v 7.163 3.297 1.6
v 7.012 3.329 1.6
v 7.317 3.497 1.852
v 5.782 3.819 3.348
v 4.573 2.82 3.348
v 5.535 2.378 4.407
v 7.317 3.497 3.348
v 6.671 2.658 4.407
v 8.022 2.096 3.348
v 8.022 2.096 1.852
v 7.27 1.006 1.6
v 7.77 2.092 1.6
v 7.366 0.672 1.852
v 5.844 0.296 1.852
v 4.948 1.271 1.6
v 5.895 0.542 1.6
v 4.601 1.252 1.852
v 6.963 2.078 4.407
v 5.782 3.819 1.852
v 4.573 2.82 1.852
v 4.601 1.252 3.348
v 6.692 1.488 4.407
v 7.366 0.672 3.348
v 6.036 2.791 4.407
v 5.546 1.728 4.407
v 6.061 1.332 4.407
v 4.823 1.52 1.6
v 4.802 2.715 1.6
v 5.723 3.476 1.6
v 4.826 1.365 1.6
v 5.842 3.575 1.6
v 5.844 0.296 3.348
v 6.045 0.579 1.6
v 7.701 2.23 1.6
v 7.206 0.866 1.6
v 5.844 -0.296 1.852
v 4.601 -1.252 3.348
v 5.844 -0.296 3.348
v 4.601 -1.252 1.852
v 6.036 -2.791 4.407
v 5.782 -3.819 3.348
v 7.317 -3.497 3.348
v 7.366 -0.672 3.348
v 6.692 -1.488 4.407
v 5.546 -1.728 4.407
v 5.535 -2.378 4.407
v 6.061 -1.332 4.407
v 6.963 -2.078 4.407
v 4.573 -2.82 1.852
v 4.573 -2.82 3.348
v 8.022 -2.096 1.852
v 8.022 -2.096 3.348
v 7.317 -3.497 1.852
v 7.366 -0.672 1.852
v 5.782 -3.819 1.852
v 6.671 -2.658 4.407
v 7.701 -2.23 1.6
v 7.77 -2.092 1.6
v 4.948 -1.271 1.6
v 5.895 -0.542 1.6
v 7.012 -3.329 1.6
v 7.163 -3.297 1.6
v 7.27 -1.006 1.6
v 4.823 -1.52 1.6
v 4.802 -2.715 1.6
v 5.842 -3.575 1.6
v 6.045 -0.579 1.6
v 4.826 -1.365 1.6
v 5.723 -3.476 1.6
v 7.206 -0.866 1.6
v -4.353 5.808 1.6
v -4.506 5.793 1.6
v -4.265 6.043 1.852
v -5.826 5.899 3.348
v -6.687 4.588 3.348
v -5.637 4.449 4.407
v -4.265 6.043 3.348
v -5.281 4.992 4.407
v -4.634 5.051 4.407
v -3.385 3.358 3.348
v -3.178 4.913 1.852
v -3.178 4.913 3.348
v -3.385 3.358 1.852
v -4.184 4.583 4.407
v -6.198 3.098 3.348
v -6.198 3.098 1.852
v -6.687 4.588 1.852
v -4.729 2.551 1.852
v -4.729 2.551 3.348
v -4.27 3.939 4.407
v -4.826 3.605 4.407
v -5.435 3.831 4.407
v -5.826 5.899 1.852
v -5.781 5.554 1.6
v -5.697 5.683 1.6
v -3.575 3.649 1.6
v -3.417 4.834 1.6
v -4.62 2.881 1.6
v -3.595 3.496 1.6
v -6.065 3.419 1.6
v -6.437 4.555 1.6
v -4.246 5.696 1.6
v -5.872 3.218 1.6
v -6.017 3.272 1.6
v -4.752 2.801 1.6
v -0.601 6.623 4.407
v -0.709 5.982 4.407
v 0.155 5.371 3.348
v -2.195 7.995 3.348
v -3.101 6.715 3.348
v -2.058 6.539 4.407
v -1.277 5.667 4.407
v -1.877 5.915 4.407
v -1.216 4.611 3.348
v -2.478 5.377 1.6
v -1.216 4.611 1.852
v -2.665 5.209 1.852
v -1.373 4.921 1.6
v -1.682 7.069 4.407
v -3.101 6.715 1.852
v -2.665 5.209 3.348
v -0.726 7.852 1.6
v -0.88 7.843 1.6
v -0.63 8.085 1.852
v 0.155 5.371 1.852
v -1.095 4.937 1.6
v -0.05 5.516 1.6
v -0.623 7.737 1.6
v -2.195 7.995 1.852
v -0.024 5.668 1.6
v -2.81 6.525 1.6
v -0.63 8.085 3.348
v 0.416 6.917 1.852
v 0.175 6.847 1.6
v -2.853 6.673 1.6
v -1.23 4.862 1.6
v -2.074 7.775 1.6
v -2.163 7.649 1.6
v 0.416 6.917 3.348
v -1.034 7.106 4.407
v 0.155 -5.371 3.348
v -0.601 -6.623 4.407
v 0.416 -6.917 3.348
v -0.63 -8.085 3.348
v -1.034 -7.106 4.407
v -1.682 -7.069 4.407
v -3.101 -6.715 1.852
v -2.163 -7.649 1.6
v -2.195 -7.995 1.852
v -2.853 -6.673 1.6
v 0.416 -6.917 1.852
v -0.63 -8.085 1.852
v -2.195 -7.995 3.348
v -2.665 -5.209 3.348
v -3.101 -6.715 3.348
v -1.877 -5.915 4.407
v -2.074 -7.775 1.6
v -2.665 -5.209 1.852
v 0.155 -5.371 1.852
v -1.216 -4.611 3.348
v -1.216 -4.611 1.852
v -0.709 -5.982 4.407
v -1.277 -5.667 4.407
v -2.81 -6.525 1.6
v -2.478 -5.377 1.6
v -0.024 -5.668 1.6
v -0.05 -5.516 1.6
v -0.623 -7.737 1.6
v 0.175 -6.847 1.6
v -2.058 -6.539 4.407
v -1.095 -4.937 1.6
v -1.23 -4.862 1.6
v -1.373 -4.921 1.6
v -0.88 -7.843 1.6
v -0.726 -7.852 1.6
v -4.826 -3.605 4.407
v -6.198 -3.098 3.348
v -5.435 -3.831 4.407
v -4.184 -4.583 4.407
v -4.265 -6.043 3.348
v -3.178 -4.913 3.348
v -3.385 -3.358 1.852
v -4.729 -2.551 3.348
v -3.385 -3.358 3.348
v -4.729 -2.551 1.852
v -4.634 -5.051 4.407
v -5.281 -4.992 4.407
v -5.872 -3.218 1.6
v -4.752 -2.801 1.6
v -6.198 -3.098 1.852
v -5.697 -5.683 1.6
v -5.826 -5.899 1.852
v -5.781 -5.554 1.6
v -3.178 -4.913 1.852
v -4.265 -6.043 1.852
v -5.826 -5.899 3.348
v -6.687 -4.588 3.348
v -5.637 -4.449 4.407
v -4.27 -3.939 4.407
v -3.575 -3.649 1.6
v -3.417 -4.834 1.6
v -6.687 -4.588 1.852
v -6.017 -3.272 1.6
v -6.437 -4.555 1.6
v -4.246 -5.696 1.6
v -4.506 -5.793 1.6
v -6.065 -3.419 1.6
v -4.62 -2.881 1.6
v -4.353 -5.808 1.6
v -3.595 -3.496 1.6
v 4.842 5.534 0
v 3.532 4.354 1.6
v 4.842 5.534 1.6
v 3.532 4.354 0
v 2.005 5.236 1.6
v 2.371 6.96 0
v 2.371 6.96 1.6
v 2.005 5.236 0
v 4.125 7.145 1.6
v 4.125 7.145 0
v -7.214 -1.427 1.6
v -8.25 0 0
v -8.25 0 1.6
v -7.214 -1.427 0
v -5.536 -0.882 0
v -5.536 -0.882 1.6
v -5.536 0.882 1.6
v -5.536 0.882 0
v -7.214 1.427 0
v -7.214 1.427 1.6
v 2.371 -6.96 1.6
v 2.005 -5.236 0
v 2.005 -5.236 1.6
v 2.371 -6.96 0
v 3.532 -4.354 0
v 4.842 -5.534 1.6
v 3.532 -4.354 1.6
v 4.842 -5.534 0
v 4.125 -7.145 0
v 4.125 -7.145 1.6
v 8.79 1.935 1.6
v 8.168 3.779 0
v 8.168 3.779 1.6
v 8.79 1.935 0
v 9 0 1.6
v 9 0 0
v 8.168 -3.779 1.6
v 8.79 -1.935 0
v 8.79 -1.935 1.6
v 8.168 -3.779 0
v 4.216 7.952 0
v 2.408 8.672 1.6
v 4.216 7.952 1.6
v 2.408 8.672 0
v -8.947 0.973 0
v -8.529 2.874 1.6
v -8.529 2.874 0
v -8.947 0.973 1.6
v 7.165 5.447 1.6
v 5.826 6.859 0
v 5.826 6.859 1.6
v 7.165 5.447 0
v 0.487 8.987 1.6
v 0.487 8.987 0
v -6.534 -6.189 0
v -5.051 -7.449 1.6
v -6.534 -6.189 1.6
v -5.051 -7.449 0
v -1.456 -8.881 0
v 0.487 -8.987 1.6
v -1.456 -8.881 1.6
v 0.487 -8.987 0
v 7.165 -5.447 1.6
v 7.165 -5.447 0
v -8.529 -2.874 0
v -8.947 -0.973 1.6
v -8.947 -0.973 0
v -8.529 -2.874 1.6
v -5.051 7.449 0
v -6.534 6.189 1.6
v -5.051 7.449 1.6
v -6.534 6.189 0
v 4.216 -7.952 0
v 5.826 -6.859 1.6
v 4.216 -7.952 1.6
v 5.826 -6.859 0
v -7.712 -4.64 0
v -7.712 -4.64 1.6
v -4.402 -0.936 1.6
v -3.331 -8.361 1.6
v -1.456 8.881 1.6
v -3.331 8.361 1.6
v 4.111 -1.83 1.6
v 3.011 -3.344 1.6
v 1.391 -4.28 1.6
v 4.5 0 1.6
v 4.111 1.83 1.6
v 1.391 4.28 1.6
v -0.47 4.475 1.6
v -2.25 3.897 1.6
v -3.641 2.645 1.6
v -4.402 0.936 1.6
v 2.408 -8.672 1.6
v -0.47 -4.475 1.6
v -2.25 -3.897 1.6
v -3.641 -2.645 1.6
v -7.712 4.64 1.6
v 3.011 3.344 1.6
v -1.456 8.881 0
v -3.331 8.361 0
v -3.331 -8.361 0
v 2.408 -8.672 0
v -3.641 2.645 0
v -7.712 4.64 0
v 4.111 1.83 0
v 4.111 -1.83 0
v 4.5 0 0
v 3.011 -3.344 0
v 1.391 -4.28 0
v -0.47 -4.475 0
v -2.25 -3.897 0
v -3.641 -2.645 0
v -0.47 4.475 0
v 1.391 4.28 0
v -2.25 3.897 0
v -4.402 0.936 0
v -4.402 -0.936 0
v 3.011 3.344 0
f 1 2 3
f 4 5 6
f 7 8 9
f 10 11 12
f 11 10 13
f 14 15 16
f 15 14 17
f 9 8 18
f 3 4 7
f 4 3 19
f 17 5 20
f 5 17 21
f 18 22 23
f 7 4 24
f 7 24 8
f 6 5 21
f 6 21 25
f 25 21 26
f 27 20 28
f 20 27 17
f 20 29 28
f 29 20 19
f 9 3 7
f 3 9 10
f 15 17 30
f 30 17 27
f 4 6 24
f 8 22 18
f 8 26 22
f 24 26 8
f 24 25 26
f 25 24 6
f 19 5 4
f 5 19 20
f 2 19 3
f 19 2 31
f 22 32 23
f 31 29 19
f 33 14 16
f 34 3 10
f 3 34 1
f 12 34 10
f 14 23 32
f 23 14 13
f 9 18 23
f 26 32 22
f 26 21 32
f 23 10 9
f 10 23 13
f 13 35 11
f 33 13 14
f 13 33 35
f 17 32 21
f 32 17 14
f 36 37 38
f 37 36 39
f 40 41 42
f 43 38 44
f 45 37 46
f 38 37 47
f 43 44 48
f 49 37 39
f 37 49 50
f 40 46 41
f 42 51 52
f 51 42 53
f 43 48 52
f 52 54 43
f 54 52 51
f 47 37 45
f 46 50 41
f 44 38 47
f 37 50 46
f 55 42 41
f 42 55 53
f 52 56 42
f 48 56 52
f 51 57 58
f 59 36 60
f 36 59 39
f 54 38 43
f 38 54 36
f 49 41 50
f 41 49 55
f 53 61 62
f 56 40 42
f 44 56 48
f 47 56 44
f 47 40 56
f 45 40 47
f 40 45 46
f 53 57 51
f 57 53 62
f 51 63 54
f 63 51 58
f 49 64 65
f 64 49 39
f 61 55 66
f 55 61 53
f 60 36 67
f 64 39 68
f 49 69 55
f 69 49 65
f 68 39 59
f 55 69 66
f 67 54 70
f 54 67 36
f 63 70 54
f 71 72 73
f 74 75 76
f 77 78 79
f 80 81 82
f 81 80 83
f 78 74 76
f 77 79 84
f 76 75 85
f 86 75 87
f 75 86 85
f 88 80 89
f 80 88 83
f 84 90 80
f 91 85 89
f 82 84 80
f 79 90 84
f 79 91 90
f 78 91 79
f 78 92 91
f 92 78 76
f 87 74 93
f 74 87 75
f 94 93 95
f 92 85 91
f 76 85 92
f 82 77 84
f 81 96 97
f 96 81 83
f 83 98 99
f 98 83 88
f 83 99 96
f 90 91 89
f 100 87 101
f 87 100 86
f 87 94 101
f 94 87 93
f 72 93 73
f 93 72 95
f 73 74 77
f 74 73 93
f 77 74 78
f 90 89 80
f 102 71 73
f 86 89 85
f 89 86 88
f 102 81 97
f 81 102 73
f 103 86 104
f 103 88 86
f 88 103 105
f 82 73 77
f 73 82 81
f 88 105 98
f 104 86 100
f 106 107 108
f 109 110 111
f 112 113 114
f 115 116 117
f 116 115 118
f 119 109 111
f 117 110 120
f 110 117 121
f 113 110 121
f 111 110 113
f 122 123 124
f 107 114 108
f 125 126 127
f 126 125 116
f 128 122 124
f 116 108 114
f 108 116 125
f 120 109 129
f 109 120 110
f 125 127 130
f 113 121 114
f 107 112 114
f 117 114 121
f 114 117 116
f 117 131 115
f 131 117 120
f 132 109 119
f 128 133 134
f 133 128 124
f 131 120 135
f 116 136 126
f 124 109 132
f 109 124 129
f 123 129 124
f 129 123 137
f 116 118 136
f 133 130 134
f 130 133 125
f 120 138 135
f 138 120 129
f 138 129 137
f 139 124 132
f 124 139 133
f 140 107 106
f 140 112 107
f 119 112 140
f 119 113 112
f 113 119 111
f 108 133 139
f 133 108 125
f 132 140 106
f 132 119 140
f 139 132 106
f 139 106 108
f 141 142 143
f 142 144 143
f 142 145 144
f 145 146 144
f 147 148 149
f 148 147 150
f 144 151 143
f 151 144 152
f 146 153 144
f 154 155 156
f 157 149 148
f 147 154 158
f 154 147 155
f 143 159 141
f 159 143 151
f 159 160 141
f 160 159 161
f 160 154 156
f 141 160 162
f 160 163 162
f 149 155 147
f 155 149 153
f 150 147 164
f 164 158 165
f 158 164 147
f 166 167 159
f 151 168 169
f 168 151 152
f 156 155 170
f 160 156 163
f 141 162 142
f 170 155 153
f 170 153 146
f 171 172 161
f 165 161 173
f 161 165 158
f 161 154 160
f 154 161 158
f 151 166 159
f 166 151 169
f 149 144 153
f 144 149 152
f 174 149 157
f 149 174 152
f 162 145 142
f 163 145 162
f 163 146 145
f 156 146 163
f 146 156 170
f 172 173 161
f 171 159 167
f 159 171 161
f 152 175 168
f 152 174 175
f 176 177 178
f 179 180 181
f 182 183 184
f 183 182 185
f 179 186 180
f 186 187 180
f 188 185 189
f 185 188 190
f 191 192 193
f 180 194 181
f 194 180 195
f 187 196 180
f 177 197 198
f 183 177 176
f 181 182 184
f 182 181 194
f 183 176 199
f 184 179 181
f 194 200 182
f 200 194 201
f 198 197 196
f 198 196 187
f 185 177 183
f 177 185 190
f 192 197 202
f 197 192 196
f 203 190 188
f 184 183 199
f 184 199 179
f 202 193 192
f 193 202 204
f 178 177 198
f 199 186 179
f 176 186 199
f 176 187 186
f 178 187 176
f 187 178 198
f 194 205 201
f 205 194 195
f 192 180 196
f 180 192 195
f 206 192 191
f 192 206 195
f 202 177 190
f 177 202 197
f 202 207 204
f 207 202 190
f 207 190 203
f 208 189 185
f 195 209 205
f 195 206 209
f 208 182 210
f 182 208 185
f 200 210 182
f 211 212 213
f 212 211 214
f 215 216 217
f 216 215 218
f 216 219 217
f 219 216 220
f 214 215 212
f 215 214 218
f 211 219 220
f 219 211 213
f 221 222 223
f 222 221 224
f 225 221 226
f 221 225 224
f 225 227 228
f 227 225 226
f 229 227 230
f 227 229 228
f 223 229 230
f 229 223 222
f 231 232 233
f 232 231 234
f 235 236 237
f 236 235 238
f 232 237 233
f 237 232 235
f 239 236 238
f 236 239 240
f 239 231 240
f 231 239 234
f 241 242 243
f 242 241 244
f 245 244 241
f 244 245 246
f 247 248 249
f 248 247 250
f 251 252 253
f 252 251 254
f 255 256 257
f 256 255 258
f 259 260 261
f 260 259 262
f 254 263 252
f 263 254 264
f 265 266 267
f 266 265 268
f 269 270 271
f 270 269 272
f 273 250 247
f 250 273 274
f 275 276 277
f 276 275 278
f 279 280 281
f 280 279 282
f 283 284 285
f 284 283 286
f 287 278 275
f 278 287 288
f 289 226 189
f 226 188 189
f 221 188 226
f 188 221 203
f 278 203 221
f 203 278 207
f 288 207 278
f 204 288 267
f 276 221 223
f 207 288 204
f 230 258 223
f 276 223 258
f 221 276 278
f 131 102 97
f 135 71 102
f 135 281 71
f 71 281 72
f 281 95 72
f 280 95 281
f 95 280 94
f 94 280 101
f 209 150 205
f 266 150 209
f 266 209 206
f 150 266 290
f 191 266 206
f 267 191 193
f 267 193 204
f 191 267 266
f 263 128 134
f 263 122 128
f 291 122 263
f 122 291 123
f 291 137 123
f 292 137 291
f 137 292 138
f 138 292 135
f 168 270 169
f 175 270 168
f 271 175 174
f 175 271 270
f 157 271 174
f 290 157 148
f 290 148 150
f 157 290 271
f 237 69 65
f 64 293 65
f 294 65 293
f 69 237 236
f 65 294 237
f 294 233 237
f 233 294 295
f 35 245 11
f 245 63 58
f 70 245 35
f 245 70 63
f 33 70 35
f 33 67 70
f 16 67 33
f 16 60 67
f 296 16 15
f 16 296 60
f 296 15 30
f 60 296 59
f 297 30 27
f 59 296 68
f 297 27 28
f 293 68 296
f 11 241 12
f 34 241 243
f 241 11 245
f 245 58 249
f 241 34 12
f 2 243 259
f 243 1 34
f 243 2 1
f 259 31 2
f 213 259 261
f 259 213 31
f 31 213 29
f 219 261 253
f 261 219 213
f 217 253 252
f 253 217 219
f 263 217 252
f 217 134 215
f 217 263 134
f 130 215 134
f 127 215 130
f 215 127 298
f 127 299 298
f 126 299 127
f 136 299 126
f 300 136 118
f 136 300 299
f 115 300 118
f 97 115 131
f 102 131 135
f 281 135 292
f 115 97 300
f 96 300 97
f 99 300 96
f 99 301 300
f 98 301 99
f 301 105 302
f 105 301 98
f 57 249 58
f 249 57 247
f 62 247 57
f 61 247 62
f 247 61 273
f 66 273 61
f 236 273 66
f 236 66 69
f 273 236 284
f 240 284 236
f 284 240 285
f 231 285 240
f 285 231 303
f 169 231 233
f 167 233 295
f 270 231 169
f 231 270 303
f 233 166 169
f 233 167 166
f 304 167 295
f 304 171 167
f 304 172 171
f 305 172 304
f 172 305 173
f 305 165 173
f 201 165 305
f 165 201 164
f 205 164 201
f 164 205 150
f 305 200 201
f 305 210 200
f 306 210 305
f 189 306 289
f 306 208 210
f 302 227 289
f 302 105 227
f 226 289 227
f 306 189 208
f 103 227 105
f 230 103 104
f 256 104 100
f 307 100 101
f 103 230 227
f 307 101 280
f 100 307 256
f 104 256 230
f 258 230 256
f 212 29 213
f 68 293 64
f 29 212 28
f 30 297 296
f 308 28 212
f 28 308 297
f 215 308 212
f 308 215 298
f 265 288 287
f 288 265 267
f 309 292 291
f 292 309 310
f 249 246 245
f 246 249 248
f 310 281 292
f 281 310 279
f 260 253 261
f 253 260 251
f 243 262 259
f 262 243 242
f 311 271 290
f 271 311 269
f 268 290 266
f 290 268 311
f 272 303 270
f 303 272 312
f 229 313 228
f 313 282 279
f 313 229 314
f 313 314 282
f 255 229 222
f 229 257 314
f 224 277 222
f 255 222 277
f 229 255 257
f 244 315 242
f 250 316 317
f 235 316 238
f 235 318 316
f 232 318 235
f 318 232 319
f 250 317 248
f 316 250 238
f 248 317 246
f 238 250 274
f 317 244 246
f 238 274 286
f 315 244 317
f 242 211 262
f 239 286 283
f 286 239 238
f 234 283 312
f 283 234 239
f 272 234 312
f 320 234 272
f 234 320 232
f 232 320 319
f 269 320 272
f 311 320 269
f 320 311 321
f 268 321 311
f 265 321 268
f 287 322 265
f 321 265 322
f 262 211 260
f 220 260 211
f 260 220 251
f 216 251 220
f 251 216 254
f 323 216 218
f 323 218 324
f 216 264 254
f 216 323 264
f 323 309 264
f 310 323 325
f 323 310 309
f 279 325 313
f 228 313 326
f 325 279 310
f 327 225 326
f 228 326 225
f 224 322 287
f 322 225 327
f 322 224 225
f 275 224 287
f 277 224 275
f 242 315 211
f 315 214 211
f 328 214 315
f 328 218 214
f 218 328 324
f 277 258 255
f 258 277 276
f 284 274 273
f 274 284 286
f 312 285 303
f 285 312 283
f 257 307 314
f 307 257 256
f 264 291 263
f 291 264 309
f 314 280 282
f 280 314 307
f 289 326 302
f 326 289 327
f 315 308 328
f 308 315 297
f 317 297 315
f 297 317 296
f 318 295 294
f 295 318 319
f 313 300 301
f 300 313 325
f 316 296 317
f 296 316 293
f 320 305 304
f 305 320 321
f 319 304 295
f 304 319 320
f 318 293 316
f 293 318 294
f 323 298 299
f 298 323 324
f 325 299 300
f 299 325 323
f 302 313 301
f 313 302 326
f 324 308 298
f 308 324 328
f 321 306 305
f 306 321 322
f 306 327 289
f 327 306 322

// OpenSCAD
//sqrt (((3.9116÷2)^2)−((3.9116−2.6)^2))
module pcb() {
    r0 = (8+1)/2;
    r1 = (18)/2;
    ball_r = (0.154 * 25.4) / 2;
    ball_center = (r0 + (r1-r0)/2);
    translate([0,0,2.6]) {
        rotate([0,0,1]) translate([ball_center - 0.5,0,0])
            translate([0,ball_r,0]) sphere(r=ball_r);
        rotate([0,0,-1]) translate([ball_center - 0.5,0,0])
            translate([0,-ball_r,0]) sphere(r=ball_r);

        rotate([0,0,120+1]) translate([ball_center - 0.5,0,0])
            translate([0,ball_r,0]) sphere(r=ball_r);
        rotate([0,0,120-1]) translate([ball_center - 0.5,0,0])
            translate([0,-ball_r,0]) sphere(r=ball_r);

        rotate([0,0,240+1]) translate([ball_center - 0.5,0,0])
            translate([0,ball_r,0]) sphere(r=ball_r);
        rotate([0,0,240-1]) translate([ball_center - 0.5,0,0])
            translate([0,-ball_r,0]) sphere(r=ball_r);
    }

    difference() {
        cylinder(r=r1, h=1.6);
        translate([0,0,-0.5]) cylinder(r=r0, h=3);
        
        // screw holes
        translate([0,0,-0.5]) {
            rotate([0,0,60]) translate([ball_center,0,0])
                cylinder(r=3/2, h=3);
            rotate([0,0,60+120]) translate([ball_center,0,0])
                cylinder(r=3/2, h=3);
            rotate([0,0,60+120+120]) translate([ball_center,0,0])
                cylinder(r=3/2, h=3);
        }
    }
}

pcb();
